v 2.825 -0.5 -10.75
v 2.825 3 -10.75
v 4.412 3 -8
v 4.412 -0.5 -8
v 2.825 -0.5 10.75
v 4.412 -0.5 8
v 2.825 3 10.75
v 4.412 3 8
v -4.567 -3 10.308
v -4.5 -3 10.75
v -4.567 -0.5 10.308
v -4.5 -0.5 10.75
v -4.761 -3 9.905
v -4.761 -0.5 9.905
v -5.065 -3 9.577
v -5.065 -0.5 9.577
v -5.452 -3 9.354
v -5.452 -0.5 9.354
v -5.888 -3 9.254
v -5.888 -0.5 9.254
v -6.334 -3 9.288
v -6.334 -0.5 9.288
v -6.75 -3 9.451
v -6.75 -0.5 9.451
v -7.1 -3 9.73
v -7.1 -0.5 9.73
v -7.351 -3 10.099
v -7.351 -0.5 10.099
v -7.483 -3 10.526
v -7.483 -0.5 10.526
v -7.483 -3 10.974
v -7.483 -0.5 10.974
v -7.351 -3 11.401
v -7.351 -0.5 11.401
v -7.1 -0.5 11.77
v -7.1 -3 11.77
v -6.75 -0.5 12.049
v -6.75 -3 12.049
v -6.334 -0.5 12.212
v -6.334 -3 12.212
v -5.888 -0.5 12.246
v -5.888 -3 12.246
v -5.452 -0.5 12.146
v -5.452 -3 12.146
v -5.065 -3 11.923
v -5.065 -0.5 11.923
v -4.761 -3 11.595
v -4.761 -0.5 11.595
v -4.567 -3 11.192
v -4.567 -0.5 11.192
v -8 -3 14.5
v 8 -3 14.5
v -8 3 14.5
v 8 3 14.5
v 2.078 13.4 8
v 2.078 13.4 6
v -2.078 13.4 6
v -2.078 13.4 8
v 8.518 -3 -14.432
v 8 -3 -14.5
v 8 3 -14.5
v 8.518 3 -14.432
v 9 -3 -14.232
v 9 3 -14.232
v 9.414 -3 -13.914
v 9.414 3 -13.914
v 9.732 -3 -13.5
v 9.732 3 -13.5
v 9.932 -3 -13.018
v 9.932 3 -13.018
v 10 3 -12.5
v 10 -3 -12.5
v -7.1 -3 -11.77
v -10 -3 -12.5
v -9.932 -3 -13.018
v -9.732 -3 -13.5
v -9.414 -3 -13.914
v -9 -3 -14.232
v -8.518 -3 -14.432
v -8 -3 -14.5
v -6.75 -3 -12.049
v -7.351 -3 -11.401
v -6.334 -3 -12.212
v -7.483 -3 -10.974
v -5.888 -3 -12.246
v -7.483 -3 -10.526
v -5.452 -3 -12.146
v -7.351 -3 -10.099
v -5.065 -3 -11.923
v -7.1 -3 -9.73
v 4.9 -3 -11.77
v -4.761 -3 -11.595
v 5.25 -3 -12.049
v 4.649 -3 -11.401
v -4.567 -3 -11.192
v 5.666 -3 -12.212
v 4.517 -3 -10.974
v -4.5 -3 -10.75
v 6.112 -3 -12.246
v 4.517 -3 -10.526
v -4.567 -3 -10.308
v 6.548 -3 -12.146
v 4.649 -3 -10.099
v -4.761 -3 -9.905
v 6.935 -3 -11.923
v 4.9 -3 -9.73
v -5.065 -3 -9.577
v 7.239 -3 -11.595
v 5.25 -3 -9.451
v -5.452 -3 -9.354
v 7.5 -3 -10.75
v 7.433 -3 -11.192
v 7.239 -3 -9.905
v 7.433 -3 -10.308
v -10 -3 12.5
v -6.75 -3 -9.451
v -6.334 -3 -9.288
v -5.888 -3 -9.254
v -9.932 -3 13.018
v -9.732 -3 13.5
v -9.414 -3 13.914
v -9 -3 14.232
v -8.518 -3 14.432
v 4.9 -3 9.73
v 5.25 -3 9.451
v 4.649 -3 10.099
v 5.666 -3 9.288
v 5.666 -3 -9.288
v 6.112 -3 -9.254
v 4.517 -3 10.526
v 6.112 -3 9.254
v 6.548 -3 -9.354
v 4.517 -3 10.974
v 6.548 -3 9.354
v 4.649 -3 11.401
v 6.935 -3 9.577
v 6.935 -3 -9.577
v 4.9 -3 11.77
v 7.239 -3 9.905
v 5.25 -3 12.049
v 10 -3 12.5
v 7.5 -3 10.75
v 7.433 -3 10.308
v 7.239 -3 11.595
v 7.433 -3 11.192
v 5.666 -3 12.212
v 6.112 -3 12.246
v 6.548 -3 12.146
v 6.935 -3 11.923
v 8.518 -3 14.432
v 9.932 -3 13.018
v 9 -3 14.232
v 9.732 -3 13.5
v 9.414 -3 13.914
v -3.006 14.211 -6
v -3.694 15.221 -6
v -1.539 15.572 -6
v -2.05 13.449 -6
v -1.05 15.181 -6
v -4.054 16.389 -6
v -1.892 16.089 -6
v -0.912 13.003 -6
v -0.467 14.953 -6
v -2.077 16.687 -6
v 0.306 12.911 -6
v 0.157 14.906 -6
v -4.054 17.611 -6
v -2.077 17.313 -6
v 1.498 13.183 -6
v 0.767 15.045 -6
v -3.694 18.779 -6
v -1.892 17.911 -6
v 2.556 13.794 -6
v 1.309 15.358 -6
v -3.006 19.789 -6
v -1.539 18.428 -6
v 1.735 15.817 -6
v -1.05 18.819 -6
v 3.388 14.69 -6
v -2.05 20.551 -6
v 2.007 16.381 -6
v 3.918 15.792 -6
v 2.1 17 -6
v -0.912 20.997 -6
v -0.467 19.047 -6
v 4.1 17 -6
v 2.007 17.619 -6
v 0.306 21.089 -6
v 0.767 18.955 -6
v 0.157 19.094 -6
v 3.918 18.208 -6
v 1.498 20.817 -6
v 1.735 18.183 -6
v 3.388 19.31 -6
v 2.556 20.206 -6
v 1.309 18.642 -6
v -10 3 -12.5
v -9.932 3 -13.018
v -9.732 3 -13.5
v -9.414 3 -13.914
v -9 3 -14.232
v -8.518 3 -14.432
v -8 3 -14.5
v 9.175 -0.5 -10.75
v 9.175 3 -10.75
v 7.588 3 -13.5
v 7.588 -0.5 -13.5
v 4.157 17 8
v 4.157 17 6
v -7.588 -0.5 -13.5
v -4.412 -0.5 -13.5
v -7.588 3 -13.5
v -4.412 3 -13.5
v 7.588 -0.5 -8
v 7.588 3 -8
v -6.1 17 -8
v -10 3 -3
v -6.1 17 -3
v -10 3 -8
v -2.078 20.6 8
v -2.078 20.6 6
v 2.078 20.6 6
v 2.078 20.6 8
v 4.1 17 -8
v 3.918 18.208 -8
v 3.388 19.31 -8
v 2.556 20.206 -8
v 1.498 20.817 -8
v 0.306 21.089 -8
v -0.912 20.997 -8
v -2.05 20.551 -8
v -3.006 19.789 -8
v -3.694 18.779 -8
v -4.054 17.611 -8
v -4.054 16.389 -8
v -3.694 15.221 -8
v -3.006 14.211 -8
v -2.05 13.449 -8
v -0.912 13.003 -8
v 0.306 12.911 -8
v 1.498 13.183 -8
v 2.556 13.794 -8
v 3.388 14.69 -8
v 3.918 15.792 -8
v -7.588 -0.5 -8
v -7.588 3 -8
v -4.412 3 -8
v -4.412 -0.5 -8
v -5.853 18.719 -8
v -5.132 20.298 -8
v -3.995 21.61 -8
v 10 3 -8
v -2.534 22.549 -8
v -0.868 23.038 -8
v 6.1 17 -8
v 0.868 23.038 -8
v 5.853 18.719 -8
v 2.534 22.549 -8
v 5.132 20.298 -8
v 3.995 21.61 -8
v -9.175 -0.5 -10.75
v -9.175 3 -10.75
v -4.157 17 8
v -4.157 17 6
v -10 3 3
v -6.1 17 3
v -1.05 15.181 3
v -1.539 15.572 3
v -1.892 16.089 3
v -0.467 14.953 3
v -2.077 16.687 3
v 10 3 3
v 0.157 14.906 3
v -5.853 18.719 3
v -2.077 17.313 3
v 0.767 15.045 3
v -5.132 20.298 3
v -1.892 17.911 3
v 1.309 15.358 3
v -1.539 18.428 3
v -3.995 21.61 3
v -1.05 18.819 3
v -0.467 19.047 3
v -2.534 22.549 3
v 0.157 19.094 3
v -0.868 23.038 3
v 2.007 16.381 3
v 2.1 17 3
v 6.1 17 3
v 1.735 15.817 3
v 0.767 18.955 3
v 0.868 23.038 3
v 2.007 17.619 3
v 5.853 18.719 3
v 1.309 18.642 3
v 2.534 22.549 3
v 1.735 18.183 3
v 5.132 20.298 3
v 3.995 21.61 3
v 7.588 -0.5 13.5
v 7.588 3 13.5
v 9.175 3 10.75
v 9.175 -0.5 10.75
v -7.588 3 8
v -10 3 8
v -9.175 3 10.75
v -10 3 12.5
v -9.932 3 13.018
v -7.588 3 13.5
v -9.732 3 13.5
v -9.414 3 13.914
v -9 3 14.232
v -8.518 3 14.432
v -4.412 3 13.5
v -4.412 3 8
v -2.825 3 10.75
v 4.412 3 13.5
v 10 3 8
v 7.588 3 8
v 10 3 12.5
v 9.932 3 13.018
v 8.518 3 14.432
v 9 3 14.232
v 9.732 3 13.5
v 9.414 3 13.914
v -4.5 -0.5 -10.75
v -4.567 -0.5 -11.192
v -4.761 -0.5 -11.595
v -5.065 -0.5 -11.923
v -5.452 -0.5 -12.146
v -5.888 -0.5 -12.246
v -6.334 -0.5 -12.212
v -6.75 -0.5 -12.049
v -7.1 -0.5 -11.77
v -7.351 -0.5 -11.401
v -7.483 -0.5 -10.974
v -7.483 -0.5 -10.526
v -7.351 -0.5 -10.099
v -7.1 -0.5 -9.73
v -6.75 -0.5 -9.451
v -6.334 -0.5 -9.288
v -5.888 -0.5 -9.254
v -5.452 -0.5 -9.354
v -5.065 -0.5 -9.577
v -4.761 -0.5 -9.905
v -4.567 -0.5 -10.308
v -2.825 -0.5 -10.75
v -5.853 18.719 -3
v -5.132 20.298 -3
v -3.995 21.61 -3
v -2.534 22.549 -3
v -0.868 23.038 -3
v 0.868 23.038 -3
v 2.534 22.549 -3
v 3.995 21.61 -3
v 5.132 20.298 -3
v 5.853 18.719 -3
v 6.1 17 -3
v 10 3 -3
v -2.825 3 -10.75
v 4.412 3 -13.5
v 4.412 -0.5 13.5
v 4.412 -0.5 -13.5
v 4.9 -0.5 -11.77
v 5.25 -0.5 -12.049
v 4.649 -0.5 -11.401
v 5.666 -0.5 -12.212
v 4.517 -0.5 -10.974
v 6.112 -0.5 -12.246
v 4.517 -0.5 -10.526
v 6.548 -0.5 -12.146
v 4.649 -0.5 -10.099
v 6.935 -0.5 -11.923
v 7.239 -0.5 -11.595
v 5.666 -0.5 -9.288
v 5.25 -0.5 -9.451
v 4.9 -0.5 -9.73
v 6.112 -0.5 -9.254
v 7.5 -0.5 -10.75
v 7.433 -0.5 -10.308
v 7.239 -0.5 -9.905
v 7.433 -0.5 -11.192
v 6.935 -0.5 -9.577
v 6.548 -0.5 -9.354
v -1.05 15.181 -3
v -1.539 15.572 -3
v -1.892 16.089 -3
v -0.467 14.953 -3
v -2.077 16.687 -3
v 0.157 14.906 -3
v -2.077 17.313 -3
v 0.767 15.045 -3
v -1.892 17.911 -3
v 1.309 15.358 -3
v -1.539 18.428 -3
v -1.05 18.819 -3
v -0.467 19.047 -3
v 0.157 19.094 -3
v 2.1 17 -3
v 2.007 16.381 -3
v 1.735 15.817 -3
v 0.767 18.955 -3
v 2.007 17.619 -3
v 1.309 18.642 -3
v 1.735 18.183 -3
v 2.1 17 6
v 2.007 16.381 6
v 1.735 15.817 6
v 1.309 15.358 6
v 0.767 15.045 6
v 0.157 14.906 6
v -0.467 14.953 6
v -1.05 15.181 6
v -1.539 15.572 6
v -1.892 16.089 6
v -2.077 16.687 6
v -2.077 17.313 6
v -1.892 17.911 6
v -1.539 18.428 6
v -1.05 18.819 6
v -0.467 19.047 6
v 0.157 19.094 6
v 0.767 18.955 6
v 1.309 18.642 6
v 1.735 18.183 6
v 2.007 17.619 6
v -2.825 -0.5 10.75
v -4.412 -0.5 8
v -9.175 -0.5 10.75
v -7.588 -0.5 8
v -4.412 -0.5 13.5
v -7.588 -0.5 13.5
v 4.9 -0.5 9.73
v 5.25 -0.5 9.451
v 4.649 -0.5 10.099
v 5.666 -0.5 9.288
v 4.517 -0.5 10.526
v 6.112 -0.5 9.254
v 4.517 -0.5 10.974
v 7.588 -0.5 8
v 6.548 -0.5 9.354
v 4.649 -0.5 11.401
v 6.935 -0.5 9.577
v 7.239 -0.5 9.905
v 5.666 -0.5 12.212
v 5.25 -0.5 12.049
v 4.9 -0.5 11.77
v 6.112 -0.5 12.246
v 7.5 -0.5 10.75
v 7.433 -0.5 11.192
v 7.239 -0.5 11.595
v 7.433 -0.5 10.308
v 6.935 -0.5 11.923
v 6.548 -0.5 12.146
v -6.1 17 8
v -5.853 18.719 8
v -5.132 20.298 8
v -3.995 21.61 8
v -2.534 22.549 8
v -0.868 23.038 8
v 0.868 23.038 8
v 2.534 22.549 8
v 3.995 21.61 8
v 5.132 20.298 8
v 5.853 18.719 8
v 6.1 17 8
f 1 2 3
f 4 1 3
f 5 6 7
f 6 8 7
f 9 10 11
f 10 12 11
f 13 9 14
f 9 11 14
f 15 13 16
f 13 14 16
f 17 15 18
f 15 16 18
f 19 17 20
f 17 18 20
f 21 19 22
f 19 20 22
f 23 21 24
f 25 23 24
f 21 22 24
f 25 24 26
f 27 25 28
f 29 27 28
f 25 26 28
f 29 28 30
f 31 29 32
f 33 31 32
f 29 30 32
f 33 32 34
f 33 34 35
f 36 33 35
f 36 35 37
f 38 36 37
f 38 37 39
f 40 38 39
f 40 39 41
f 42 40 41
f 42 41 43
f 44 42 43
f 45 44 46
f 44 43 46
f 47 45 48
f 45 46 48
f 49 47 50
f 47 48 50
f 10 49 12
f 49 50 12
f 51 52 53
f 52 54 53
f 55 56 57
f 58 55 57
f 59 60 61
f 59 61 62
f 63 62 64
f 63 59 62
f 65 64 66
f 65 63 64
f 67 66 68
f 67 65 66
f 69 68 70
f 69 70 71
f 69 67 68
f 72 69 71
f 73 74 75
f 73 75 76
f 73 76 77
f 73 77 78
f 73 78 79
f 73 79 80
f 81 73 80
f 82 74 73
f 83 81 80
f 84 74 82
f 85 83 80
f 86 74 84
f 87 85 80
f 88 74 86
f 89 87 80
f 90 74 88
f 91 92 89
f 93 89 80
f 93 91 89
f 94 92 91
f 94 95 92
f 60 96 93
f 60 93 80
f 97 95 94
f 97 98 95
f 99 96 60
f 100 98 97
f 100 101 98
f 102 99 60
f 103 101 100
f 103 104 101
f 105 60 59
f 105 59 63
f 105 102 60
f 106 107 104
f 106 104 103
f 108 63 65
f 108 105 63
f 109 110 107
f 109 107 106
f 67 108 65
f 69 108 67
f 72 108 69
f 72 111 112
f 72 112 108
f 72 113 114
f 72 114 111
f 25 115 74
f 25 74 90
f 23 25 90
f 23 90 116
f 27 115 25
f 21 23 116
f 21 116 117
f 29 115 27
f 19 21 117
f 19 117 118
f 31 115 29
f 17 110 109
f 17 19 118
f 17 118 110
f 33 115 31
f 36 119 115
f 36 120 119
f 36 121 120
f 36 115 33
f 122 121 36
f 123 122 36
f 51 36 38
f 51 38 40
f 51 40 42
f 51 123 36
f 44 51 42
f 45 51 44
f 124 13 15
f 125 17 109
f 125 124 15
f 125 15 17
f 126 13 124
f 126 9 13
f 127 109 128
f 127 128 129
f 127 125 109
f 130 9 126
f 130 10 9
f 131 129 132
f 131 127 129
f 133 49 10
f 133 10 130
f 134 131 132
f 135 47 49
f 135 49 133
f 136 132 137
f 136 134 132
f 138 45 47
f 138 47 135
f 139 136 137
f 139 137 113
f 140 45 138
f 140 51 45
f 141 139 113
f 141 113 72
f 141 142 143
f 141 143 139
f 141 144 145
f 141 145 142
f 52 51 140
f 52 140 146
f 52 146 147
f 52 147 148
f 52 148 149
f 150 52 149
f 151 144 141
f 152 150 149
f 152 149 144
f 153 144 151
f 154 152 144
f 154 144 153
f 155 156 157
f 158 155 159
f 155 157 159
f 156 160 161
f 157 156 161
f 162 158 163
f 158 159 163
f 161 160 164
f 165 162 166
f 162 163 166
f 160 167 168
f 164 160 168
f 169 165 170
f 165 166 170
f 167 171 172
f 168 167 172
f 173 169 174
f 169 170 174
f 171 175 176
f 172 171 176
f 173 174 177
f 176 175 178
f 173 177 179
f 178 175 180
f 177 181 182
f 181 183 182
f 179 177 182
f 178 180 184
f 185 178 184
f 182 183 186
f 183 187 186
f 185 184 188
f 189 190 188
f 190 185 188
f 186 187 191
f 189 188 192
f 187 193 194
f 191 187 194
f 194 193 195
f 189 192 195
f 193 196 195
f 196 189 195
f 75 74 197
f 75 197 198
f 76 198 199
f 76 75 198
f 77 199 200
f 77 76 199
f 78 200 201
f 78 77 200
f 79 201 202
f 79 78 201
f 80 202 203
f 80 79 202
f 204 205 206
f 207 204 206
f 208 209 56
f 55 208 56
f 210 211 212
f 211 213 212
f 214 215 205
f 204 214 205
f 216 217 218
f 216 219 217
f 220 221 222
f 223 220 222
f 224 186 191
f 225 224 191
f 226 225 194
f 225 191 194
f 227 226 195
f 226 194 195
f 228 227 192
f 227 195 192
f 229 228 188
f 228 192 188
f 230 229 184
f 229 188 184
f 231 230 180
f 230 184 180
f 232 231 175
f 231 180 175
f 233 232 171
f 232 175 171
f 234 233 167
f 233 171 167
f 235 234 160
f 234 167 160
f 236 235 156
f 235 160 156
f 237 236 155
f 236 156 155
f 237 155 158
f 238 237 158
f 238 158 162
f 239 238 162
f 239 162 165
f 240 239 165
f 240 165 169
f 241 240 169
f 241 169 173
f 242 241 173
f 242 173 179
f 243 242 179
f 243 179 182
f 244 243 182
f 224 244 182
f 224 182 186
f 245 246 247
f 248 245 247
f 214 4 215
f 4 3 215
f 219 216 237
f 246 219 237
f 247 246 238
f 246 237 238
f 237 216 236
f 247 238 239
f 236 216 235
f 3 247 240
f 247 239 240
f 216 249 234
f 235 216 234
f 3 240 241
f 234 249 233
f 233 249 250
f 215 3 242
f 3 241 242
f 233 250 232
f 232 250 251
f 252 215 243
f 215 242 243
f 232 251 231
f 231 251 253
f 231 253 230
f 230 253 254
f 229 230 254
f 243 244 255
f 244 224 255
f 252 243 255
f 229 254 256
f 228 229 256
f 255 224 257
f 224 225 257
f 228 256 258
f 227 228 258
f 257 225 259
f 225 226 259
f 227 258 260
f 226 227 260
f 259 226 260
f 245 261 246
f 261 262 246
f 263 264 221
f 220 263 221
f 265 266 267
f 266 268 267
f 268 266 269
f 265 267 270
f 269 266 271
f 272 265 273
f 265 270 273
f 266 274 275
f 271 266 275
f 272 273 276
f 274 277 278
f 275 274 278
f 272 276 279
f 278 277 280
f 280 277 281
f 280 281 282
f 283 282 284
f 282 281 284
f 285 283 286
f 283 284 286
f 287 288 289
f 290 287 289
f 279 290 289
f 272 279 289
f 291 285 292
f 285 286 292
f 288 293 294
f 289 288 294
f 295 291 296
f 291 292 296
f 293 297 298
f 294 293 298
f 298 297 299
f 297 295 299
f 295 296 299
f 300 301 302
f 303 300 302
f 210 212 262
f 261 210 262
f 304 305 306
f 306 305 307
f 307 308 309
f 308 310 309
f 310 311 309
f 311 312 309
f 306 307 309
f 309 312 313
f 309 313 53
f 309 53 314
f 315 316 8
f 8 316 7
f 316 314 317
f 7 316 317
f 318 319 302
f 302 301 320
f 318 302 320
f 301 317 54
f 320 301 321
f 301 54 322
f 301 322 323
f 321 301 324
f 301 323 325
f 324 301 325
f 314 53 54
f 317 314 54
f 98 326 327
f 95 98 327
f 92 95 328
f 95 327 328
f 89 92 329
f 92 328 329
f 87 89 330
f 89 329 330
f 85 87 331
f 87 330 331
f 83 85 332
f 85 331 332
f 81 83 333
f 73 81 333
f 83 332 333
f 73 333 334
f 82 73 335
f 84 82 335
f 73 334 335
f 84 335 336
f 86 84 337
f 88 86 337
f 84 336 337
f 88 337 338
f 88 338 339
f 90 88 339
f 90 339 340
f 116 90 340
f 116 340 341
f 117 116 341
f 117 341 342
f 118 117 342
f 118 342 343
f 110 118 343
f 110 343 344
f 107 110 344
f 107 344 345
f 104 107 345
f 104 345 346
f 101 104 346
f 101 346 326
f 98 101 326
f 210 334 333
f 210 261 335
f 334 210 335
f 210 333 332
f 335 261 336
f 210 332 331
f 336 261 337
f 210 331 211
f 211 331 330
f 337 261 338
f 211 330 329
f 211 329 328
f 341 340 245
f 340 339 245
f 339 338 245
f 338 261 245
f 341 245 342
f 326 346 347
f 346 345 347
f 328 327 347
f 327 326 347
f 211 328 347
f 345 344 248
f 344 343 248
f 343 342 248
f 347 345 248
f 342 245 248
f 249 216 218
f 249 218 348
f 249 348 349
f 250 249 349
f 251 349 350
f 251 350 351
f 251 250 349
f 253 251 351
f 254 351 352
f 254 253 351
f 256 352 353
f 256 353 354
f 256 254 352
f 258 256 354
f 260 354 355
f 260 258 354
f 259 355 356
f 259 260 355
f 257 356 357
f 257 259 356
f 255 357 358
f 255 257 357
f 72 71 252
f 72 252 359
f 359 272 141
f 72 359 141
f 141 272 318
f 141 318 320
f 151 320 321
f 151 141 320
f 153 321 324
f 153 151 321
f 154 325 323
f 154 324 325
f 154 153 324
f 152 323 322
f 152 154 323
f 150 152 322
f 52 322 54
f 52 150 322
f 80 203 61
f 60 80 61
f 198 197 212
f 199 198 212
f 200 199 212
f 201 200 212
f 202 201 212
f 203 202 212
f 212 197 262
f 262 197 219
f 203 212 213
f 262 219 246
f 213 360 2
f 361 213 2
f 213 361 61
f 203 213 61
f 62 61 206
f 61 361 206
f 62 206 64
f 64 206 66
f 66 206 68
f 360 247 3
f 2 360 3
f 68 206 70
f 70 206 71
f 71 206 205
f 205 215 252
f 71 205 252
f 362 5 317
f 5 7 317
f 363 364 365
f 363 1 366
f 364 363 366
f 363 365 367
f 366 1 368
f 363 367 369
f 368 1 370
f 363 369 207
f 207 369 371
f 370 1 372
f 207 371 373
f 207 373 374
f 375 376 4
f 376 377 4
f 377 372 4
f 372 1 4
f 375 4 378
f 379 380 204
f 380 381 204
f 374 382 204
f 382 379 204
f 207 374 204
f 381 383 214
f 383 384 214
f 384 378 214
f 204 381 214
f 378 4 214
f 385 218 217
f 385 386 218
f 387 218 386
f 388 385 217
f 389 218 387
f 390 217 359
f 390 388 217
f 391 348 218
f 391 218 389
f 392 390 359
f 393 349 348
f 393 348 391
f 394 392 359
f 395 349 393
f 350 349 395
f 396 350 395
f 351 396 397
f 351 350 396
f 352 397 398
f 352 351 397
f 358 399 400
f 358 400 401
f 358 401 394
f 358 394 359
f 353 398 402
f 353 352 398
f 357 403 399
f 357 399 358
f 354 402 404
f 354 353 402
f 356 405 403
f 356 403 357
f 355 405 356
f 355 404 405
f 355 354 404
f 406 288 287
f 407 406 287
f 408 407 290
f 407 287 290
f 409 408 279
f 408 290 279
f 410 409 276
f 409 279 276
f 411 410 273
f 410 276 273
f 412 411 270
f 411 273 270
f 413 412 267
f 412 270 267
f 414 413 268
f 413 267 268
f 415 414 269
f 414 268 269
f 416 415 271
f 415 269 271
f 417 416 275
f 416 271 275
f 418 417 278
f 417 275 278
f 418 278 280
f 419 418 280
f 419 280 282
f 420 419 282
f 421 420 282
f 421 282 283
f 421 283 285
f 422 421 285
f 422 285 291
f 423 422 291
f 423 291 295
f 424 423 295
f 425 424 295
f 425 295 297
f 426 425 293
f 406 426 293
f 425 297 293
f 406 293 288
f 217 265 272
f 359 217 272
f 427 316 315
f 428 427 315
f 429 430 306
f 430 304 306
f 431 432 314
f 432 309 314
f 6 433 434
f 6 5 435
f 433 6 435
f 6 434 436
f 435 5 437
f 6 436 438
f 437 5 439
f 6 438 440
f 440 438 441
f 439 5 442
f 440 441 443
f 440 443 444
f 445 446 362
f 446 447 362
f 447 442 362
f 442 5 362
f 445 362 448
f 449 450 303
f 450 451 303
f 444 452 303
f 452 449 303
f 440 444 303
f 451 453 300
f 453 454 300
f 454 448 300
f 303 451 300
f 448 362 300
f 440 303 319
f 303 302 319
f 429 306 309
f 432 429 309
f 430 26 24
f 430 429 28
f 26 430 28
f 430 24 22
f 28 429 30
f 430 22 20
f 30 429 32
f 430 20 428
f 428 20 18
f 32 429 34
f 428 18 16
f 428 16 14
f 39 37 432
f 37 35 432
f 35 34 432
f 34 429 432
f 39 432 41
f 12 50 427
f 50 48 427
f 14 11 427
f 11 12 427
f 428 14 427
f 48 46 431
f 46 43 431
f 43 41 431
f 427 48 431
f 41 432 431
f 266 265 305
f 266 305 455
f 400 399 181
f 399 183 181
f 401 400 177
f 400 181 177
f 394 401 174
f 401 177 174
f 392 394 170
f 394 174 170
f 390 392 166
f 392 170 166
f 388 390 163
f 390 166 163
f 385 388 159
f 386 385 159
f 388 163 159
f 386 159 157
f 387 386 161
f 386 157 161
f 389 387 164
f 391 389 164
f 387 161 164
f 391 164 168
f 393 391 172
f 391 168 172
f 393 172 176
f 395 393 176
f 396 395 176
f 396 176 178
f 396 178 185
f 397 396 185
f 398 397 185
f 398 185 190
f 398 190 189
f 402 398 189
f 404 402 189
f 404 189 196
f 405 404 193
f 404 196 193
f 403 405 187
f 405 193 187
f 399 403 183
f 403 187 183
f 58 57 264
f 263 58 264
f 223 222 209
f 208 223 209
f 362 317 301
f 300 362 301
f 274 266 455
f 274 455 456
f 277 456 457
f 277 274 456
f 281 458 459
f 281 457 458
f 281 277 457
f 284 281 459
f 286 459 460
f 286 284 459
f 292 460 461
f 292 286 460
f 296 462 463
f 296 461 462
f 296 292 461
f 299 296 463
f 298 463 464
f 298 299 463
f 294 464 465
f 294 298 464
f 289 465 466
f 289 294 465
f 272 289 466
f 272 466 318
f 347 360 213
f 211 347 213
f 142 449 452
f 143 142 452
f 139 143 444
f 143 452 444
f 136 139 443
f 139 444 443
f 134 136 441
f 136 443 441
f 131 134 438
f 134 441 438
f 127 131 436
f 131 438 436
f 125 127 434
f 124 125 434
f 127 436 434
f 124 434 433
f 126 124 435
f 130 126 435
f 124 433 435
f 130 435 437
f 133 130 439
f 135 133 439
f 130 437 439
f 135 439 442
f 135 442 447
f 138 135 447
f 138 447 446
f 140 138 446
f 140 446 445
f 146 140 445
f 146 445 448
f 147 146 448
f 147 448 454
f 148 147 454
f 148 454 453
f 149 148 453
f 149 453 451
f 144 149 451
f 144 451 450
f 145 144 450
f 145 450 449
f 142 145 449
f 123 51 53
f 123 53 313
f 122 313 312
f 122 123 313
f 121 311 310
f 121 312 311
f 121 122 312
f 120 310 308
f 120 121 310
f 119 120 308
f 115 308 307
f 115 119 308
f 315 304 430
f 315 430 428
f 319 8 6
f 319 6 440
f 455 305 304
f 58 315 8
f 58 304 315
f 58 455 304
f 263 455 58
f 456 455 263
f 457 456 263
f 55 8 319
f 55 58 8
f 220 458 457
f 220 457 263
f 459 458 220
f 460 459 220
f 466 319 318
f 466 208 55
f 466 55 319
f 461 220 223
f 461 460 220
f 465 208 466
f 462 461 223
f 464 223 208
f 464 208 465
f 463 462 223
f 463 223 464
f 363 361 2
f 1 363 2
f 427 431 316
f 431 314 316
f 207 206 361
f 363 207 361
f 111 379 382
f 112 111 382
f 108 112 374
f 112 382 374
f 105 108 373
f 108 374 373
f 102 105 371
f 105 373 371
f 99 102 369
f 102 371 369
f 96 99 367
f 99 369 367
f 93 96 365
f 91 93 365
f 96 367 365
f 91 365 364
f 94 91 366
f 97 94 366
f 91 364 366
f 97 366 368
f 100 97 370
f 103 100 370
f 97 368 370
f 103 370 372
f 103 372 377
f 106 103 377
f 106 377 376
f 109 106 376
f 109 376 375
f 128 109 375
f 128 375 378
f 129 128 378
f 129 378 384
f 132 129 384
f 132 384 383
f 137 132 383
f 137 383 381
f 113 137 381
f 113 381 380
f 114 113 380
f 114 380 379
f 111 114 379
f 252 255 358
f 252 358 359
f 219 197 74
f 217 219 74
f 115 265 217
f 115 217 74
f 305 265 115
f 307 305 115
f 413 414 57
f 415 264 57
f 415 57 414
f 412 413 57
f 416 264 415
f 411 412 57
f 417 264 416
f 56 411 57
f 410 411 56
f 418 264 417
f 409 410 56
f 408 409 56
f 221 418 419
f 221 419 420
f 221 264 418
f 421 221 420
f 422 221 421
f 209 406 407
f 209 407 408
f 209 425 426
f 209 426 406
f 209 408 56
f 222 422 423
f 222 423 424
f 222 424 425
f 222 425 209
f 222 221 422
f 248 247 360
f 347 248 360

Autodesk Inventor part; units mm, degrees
ref_plane "YZ Plane" through (0, 0, 0) normal (1, 0, 0) x (0, 1, 0)
ref_plane "XZ Plane" through (0, 0, 0) normal (0, 1, 0) x (-1, 0, 0)
ref_plane "XY Plane" through (0, 0, 0) normal (0, 0, 1) x (1, 0, 0)
sketch "Vertical" plane through (0, 0, 0) normal (0, 0, 1) x (1, 0, 0)
  line L0 (10, -3) -> (-10, -3)
  line L1 (-10, -3) -> (-10, 3)
  line L2 (-10, 3) -> (10, 3)
  line L3 (10, 3) -> (10, -3)
  line L4 (10, -3) -> (-10, 3) construction
  line L5 (-10, -3) -> (10, 3) construction
  line L6 (-10, 3) -> (-6.1, 17)
  arc A0 (6.1, 17) -> (-6.1, 17) centre (0, 17) ccw
  line L7 (6.1, 17) -> (10, 3)
  line L8 (0, -8.22) -> (0, 28.32) projected
  circle A1 centre (0, 17) radius 2.1
  line L9 (-6.1, 17) -> (6.1, 17)
  circle A2 centre (0, 17) radius 4.1
  line L10 (-4.1569, 17) -> (-2.0785, 20.6)
  line L11 (-2.0785, 20.6) -> (2.0785, 20.6)
  line L12 (2.0785, 20.6) -> (4.1569, 17)
  line L13 (4.1569, 17) -> (2.0785, 13.4)
  line L14 (2.0785, 13.4) -> (-2.0785, 13.4)
  line L15 (-2.0785, 13.4) -> (-4.1569, 17)
  point P0 (0, 0)
  point P1 (0, 0)
  point P2 (-1.9621, 20.6)
  point P3 (-2.1366, 20.4993)
  point P4 (4.0988, 17.1007)
  point P5 (4.0988, 16.8993)
  point P6 (2.1366, 20.4993)
  point P7 (1.9621, 20.6)
  point P8 (1.9621, 13.4)
  point P9 (2.1366, 13.5007)
  point P10 (-2.1366, 13.5007)
  point P11 (-1.9621, 13.4)
  point P12 (-4.0988, 16.8993)
  point P13 (-4.0988, 17.1007)
  dimension "d6" = 6
  dimension "d7" = 20
  dimension "d8" = 14
  dimension "d9" = 4.2
  dimension "d10" = 4
  dimension "d11" = 8.2
  dimension "d12" = 20
  dimension "d34" = 7.2
extrude "Extrusion1" add sketch "Vertical" along normal mid plane 16 contours L2 L8 A2 L14 L13 L9 L7 | L2 L6 L9 L15 A2 L14 L8 | L9 L12 A2 L11 L8 A0 | A2 L14 L8 | L8 L14 A2 | L8 A2 L11 L10 L9 A0 | L13 A2 L9 | L9 A2 L12 | L14 A2 L15 L9 A1 L8 | L8 A1 L9 A2 L13 L14 | L14 L15 A2 | A2 L13 L14 | A2 L11 L8 | L8 L11 A2 | L9 A1 L8 L11 A2 L12 | L12 A2 | A2 L13 | L10 A2 L9 | L9 A2 L15 | A2 L15 | L8 A1 L9 A2 L10 L11 | L11 L12 A2 | A2 L10 L11 | A2 L10
extrude "Extrusion6" cut sketch "Vertical" against normal through all contours A2 L14 L8 | L8 L14 A2 | L14 A2 L15 L9 A1 L8 | L8 A1 L9 A2 L13 L14 | A2 L11 L8 | L8 L11 A2 | L9 A1 L8 L11 A2 L12 | L12 A2 | A2 L13 | A1 L9 L8 | L8 L9 A1 | A2 L15 | L8 A1 L9 A2 L10 L11 | L9 L8 A1 | A2 L10 | L9 A1 L8
extrude "Extrusion8" cut sketch "Vertical" along normal through all contours L13 A2 L9 | L9 A2 L12 | L14 A2 L15 L9 A1 L8 | L8 A1 L9 A2 L13 L14 | L14 L15 A2 | A2 L13 L14 | L9 A1 L8 L11 A2 L12 | L10 A2 L9 | L9 A2 L15 | A1 L9 L8 | L8 L9 A1 | L8 A1 L9 A2 L10 L11 | L11 L12 A2 | A2 L10 L11 | L9 L8 A1 | L9 A1 L8
extrude "Extrusion7" add sketch "Vertical" along normal mid plane 12 contours A2 L14 L8 | L8 L14 A2 | L13 A2 L9 | L9 A2 L12 | L14 A2 L15 L9 A1 L8 | L8 A1 L9 A2 L13 L14 | L14 L15 A2 | A2 L13 L14 | A2 L11 L8 | L8 L11 A2 | L9 A1 L8 L11 A2 L12 | L12 A2 | A2 L13 | L10 A2 L9 | L9 A2 L15 | A2 L15 | L8 A1 L9 A2 L10 L11 | L11 L12 A2 | A2 L10 L11 | A2 L10
extrude "Extrusion2" cut sketch "Vertical" along normal mid plane 6 contours L2 L8 A2 L14 L13 L9 L7 | L2 L6 L9 L15 A2 L14 L8 | L9 L12 A2 L11 L8 A0 | A2 L14 L8 | L8 L14 A2 | L8 A2 L11 L10 L9 A0 | L13 A2 L9 | L9 A2 L12 | L14 A2 L15 L9 A1 L8 | L8 A1 L9 A2 L13 L14 | L14 L15 A2 | A2 L13 L14 | A2 L11 L8 | L8 L11 A2 | L9 A1 L8 L11 A2 L12 | L12 A2 | A2 L13 | L10 A2 L9 | L9 A2 L15 | A1 L9 L8 | L8 L9 A1 | A2 L15 | L8 A1 L9 A2 L10 L11 | L11 L12 A2 | A2 L10 L11 | L9 L8 A1 | A2 L10 | L9 A1 L8
sketch "Horizontale" plane through (-10, 3, 8) normal (0, -1, 0) x (1, 0, 0)
  line L0 (0, -5) -> (20, -5) projected
  line L1 (20, -5) -> (20, 0) projected
  line L2 (0, 0) -> (20, 0) projected
  line L3 (0, -5) -> (0, 0) projected
  line L4 (20, -11) -> (0, -11) projected
  line L5 (0, -16) -> (0, -11) projected
  line L6 (20, -16) -> (0, -16) projected
  line L7 (20, -16) -> (20, -11) projected
  line L8 (20, -8) -> (0, -8) projected
  line L9 (0, -22.5) -> (20, -22.5)
  line L10 (20, -22.5) -> (20, 6.5)
  line L11 (20, 6.5) -> (0, 6.5)
  line L12 (0, 6.5) -> (0, -22.5)
  line L13 (0, -22.5) -> (20, 6.5) construction
  line L14 (20, -22.5) -> (0, 6.5) construction
  line L15 (4, -18.75) -> (16, -18.75) construction
  line L16 (16, -18.75) -> (16, 2.75) construction
  line L17 (16, 2.75) -> (4, 2.75) construction
  line L18 (4, 2.75) -> (4, -18.75) construction
  line L19 (4, -18.75) -> (16, 2.75) construction
  line L20 (16, -18.75) -> (4, 2.75) construction
  circle A0 centre (16, 2.75) radius 1.5
  circle A1 centre (4, 2.75) radius 1.5
  circle A2 centre (16, -18.75) radius 1.5
  circle A3 centre (4, -18.75) radius 1.5
  line L21 (14.4123, 0) -> (12.8246, 2.75)
  line L22 (12.8246, 2.75) -> (14.4123, 5.5)
  line L23 (14.4123, 5.5) -> (17.5877, 5.5)
  line L24 (17.5877, 5.5) -> (19.1754, 2.75)
  line L25 (19.1754, 2.75) -> (17.5877, 0)
  line L26 (17.5877, 0) -> (14.4123, 0)
  line L27 (2.4123, 0) -> (0.8246, 2.75)
  line L28 (0.8246, 2.75) -> (2.4123, 5.5)
  line L29 (2.4123, 5.5) -> (5.5877, 5.5)
  line L30 (5.5877, 5.5) -> (7.1754, 2.75)
  line L31 (7.1754, 2.75) -> (5.5877, 0)
  line L32 (5.5877, 0) -> (2.4123, 0)
  line L33 (5.5877, -16) -> (7.1754, -18.75)
  line L34 (7.1754, -18.75) -> (5.5877, -21.5)
  line L35 (5.5877, -21.5) -> (2.4123, -21.5)
  line L36 (2.4123, -21.5) -> (0.8246, -18.75)
  line L37 (0.8246, -18.75) -> (2.4123, -16)
  line L38 (2.4123, -16) -> (5.5877, -16)
  line L39 (17.5877, -16) -> (19.1754, -18.75)
  line L40 (19.1754, -18.75) -> (17.5877, -21.5)
  line L41 (17.5877, -21.5) -> (14.4123, -21.5)
  line L42 (14.4123, -21.5) -> (12.8246, -18.75)
  line L43 (12.8246, -18.75) -> (14.4123, -16)
  line L44 (14.4123, -16) -> (17.5877, -16)
  point P0 (10, -8)
  point P1 (16, 0)
  point P2 (4, 0)
  point P3 (4, -16)
  point P4 (16, -16)
  point P5 (2.4123, 0)
  point P6 (5.5877, 0)
  point P7 (2.4123, -16)
  point P8 (14.4123, 0)
  point P9 (17.5877, 0)
  dimension "d17" = 5.5
  dimension "d18" = 3
  dimension "d19" = 1
  dimension "d20" = 12
  dimension "d21" = 21.5
  dimension "d28" = 6
extrude "Extrusion3" add sketch "Horizontale" along normal blind 6 contours L3 L2 L1 L0 | L0 L10 L8 L12 | L12 L11 L10 L2 L25 L24 L23 L22 L21 L31 L30 L29 L28 L27 | L8 L10 L4 L12 | L27 L28 L29 L30 L31 L2 | L4 L7 L6 L5 | L2 L21 L22 L23 L24 L25 | L6 L37 L36 L35 L34 L33 L43 L42 L41 L40 L39 L10 L9 L12 | L6 L33 L34 L35 L36 L37 | L39 L40 L41 L42 L43 L6 | A0 | A1 | A2 | A3
extrude "Extrusion4" cut sketch "Horizontale" along normal through all contours A0 | A1 | A2 | A3
extrude "Extrusion5" cut sketch "Horizontale" along normal blind 3.5 contours L27 L28 L29 L30 L31 L2 | L2 L21 L22 L23 L24 L25 | L6 L33 L34 L35 L36 L37 | L39 L40 L41 L42 L43 L6
fillet "Congé1" radius 2 4 edges at (10, 0, 14.5) (-10, 0, 14.5) (10, 0, -14.5) (-10, 0, -14.5)
properties part number "Support rotation"
